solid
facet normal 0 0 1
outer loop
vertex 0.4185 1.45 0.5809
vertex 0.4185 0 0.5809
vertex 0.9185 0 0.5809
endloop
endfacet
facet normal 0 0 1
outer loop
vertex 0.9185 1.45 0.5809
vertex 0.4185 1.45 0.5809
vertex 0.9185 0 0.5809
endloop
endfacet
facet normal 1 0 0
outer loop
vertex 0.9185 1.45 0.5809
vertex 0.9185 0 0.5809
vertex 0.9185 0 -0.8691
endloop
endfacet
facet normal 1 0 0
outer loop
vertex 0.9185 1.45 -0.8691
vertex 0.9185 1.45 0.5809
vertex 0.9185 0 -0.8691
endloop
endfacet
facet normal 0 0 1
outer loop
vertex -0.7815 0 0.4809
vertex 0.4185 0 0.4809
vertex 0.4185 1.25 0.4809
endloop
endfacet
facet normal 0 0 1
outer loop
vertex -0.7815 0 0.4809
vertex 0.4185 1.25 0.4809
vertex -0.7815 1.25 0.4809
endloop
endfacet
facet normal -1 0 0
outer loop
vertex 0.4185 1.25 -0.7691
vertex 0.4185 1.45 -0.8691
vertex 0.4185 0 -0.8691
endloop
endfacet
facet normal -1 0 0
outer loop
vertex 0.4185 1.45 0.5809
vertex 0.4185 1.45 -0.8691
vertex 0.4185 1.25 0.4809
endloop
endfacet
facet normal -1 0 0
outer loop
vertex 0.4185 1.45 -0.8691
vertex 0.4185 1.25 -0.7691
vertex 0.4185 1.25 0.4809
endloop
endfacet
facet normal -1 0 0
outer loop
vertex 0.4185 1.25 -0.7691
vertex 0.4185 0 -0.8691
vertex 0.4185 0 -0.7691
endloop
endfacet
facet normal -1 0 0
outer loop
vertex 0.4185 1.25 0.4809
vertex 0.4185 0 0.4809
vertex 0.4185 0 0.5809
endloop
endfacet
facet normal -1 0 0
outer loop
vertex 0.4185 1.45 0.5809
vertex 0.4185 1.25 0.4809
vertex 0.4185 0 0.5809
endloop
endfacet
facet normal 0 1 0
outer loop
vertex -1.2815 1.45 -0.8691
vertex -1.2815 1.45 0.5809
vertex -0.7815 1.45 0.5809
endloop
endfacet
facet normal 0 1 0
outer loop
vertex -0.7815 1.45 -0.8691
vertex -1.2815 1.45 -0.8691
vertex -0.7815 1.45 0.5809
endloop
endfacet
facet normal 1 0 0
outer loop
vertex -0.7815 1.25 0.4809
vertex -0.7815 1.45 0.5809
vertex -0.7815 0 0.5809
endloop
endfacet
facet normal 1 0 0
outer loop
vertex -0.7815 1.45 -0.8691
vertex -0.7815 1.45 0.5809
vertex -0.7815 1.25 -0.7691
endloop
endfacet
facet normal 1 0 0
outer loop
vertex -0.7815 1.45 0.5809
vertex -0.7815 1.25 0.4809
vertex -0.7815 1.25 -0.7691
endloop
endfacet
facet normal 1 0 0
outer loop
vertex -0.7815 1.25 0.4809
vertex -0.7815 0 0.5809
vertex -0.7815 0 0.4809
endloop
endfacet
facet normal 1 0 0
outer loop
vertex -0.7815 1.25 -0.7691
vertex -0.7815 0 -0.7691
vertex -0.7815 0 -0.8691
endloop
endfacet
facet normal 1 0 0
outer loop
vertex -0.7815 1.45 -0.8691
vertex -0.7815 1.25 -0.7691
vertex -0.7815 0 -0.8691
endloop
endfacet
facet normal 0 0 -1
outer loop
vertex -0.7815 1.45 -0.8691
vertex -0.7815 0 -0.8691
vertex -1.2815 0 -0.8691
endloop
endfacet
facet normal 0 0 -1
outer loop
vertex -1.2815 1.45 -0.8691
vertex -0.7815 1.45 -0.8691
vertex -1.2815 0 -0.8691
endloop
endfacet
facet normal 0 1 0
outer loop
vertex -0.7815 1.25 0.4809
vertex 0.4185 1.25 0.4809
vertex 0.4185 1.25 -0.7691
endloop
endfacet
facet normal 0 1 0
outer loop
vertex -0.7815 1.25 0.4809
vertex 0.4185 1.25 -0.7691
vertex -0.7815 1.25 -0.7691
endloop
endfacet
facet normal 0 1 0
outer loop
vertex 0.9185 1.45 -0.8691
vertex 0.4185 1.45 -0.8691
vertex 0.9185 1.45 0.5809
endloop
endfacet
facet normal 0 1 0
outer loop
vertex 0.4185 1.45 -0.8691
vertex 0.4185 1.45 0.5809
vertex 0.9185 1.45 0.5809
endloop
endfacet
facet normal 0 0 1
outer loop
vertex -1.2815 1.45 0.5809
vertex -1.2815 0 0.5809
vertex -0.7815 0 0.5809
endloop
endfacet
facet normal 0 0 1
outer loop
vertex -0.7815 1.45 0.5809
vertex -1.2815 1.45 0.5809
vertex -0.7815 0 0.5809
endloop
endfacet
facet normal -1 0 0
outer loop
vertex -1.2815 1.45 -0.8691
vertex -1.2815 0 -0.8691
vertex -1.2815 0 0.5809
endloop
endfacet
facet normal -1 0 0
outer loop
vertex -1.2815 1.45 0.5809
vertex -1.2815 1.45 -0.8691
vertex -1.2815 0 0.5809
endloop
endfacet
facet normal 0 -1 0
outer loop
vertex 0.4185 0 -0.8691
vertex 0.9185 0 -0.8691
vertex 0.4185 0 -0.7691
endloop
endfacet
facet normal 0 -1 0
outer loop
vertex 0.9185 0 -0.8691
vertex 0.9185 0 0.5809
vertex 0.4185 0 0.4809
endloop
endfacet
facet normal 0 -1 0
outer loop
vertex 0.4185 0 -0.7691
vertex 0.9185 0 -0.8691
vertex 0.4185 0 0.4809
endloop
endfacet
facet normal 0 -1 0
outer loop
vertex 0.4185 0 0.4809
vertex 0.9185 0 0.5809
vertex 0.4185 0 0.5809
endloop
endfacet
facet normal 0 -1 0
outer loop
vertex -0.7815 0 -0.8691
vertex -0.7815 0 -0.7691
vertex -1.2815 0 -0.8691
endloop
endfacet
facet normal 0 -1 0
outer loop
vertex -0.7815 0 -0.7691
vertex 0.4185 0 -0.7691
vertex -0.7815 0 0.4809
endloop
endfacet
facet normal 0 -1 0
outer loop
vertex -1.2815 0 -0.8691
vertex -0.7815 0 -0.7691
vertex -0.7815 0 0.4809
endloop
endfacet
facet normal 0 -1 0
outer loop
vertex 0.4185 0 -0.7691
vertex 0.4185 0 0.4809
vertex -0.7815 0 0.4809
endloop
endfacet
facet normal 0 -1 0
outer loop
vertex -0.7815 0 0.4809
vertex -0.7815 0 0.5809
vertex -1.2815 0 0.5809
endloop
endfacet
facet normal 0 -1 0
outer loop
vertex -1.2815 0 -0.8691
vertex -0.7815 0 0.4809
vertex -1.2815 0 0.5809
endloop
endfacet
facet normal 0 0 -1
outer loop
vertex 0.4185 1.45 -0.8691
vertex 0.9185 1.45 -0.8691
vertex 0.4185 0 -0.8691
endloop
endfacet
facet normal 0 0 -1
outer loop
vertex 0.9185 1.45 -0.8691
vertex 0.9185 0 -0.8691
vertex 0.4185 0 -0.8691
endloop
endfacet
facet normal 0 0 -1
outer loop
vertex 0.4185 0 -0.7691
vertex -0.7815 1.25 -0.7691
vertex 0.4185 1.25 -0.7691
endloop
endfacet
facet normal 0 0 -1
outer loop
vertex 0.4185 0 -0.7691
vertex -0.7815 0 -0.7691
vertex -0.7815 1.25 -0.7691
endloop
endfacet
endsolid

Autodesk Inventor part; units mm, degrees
ref_plane "YZ Plane" through (0, 0, 0) normal (1, 0, 0) x (0, 1, 0)
ref_plane "XZ Plane" through (0, 0, 0) normal (0, 1, 0) x (-1, 0, 0)
ref_plane "XY Plane" through (0, 0, 0) normal (0, 0, 1) x (1, 0, 0)
sketch "Sketch1" plane through (0, 0, 0) normal (0, 1, 0) x (-1, 0, 0)
  line L0 (-0.8185, 0.4809) -> (1.1815, 0.4809)
  line L1 (1.1815, 0.4809) -> (1.1815, -0.7691)
  line L2 (1.1815, -0.7691) -> (-0.8185, -0.7691)
  line L3 (-0.8185, -0.7691) -> (-0.8185, 0.4809)
  point P0 (0, 0)
  dimension "d0" = 2
  dimension "d1" = 1.25
extrude "Extrusion1" add sketch "Sketch1" along normal blind 1.25
sketch "Sketch2" plane through (0, 0, 0) normal (0, -1, 0) x (1, 0, 0)
  line L0 (0.8185, 0.4809) -> (-1.1815, 0.4809) projected
  line L1 (0.8185, -0.7691) -> (0.8185, 0.4809) projected
  line L2 (-1.2815, 0.5809) -> (-0.7815, 0.5809)
  line L3 (-0.7815, 0.5809) -> (-0.7815, -0.8691)
  line L4 (-0.7815, -0.8691) -> (-1.2815, -0.8691)
  line L5 (-1.2815, -0.8691) -> (-1.2815, 0.5809)
  line L6 (0.4185, 0.5809) -> (0.9185, 0.5809)
  line L7 (0.9185, 0.5809) -> (0.9185, -0.8691)
  line L8 (0.9185, -0.8691) -> (0.4185, -0.8691)
  line L9 (0.4185, -0.8691) -> (0.4185, 0.5809)
  point P0 (0, 0)
  dimension "d4" = 0.5
  dimension "d5" = 0.5
  dimension "d6" = 1.45
  dimension "d7" = 1.45
  dimension "d8" = 0.1
  dimension "d9" = 0.1
  dimension "d10" = 2.2
  dimension "d11" = 0.1
extrude "Extrusion2" add sketch "Sketch2" against normal blind 1.45
properties part number "0806Cap"
